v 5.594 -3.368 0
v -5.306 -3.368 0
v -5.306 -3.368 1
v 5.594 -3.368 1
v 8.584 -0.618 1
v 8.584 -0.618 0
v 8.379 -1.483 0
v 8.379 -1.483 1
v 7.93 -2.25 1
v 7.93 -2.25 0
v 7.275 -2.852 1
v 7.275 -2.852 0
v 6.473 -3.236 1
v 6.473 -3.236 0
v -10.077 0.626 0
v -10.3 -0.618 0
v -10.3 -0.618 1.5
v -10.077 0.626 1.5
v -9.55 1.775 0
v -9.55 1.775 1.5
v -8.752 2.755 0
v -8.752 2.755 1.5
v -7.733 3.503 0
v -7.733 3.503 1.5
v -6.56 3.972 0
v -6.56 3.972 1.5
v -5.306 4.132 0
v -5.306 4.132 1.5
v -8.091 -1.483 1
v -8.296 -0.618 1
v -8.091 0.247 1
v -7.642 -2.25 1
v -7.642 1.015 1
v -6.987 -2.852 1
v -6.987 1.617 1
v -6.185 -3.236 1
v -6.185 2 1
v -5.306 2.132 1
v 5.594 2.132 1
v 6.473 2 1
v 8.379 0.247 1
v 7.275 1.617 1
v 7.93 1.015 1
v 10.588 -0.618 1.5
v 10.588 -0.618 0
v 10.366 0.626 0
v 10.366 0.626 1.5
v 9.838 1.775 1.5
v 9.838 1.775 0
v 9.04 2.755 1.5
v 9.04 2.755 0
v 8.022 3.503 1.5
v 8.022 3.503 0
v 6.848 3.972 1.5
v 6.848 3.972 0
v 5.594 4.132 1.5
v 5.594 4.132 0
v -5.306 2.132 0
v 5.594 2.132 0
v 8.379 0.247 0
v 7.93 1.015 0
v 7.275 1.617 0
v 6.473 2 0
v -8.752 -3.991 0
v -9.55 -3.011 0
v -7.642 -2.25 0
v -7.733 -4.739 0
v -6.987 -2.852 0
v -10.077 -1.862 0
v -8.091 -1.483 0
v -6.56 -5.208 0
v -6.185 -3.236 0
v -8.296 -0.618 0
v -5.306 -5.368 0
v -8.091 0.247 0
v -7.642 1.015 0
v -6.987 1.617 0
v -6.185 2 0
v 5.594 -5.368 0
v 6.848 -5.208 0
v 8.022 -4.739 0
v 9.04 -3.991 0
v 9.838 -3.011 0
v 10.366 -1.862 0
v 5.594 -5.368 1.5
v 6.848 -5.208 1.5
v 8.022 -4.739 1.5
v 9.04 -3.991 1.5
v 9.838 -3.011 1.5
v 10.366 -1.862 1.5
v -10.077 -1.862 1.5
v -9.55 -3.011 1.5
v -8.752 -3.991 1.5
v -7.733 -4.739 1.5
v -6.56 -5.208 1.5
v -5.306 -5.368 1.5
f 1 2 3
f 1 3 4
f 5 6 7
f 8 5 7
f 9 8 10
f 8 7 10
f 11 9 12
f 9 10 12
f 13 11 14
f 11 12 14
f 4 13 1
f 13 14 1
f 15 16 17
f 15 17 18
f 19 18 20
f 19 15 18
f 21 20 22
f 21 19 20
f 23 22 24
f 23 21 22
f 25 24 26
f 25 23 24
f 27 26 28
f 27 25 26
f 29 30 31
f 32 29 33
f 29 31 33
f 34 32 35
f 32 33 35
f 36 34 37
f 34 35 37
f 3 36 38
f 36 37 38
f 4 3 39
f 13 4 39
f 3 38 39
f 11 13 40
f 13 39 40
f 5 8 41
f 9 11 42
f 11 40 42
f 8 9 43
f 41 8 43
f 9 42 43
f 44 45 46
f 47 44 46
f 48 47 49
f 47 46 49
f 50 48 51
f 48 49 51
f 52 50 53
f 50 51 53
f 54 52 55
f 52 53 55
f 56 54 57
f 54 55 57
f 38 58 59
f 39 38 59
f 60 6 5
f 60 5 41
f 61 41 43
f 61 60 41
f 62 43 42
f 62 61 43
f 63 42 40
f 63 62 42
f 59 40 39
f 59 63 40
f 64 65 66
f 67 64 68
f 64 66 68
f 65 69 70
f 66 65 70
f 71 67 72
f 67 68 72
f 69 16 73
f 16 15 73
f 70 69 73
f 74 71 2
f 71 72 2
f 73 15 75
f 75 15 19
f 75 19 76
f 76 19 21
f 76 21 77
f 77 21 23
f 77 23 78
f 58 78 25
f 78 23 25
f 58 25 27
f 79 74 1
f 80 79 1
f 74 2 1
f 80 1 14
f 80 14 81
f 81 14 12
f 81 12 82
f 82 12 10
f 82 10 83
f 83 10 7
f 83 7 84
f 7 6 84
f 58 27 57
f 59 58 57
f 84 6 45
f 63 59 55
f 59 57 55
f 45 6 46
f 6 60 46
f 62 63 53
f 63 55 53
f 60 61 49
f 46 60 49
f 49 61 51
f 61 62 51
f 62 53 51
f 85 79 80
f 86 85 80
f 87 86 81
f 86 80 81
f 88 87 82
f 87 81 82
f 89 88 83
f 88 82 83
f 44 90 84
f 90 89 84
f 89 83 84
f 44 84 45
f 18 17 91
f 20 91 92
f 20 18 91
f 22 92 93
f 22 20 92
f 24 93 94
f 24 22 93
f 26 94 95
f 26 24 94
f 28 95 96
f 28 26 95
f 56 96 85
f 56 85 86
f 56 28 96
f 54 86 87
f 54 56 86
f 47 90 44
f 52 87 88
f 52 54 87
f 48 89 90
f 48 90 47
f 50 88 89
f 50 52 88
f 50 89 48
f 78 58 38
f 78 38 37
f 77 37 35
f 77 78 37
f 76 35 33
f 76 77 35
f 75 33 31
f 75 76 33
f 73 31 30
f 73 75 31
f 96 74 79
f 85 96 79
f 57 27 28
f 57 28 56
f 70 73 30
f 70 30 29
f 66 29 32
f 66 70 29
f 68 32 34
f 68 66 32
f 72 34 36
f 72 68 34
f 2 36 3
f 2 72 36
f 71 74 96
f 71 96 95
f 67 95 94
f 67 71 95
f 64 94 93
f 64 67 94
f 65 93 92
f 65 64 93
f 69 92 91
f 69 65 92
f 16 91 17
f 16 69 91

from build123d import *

# Parameters (mm, degrees)
F0_W        = 20.9
F0_H        = 9.5
F1_DEPTH    = 1.5
F2_W        = 16.9
F2_H        = 5.5
F3_DEPTH    = 1
F4_T1_DEPTH = 1
F5_T1_DEPTH = 26.5


# Not quite as in the source:
# - a fillet or chamfer that OpenCascade refuses, or shapes differently, is made with other operations: its cross-section is extruded or revolved along the edge and cut away or added


with BuildPart() as f1:
    # F0 (on Top) → F1 (new body)
    with BuildSketch(Plane.XY):
        with Locations((0.1440625638, -0.617788887)):
            Rectangle(F0_W, F0_H)
    extrude(amount=F1_DEPTH)

    # F2 (on Top) → F3 (cut)
    with BuildSketch(Plane.XY):
        with Locations((0.1440625638, -0.617788887)):
            Rectangle(F2_W, F2_H)
    extrude(amount=F3_DEPTH, mode=Mode.SUBTRACT)

    # F4: fillet of radius 3 on 4 edges, made by hand

    # F4_s2 → F4_t1 (join)
    with BuildSketch(Plane.XY):
        with BuildLine():
            ThreePointArc((8.5940625638, -0.367788887), (7.7153829073, -2.4891092305), (5.5940625638, -3.367788887))
            Line((5.5940625638, -3.367788887), (8.5940625638, -3.367788887))
            Line((8.5940625638, -3.367788887), (8.5940625638, -0.367788887))
        make_face()
        with BuildLine():
            ThreePointArc((-5.3059374362, 2.132211113), (-7.4272577798, 1.2535314566), (-8.3059374362, -0.867788887))
            Line((-8.3059374362, -0.867788887), (-8.3059374362, 2.132211113))
            Line((-8.3059374362, 2.132211113), (-5.3059374362, 2.132211113))
        make_face()
        with BuildLine():
            ThreePointArc((8.5940625638, -0.867788887), (7.7153829073, 1.2535314566), (5.5940625638, 2.132211113))
            Line((5.5940625638, 2.132211113), (8.5940625638, 2.132211113))
            Line((8.5940625638, 2.132211113), (8.5940625638, -0.867788887))
        make_face()
        with BuildLine():
            ThreePointArc((-8.3059374362, -0.367788887), (-7.4272577798, -2.4891092305), (-5.3059374362, -3.367788887))
            Line((-5.3059374362, -3.367788887), (-8.3059374362, -3.367788887))
            Line((-8.3059374362, -3.367788887), (-8.3059374362, -0.367788887))
        make_face()
    extrude(amount=F4_T1_DEPTH)

    # F5: fillet of radius 5 on 4 edges, made by hand

    # F5_s2 → F5_t1 (cut)
    with BuildSketch(Plane.XY.offset(-12.5)):
        with BuildLine():
            ThreePointArc((-10.3059374362, -0.867788887), (-8.8414713422, 2.667745019), (-5.3059374362, 4.132211113))
            Line((-5.3059374362, 4.132211113), (-10.3059374362, 4.132211113))
            Line((-10.3059374362, 4.132211113), (-10.3059374362, -0.867788887))
        make_face()
        with BuildLine():
            ThreePointArc((-5.3059374362, -5.367788887), (-8.8414713422, -3.9033227929), (-10.3059374362, -0.367788887))
            Line((-10.3059374362, -0.367788887), (-10.3059374362, -5.367788887))
            Line((-10.3059374362, -5.367788887), (-5.3059374362, -5.367788887))
        make_face()
        with BuildLine():
            ThreePointArc((10.5940625638, -0.867788887), (9.1295964697, 2.667745019), (5.5940625638, 4.132211113))
            Line((5.5940625638, 4.132211113), (10.5940625638, 4.132211113))
            Line((10.5940625638, 4.132211113), (10.5940625638, -0.867788887))
        make_face()
        with BuildLine():
            ThreePointArc((5.5940625638, -5.367788887), (9.1295964697, -3.9033227929), (10.5940625638, -0.367788887))
            Line((10.5940625638, -0.367788887), (10.5940625638, -5.367788887))
            Line((10.5940625638, -5.367788887), (5.5940625638, -5.367788887))
        make_face()
    extrude(amount=F5_T1_DEPTH, mode=Mode.SUBTRACT)


solid = f1.part
